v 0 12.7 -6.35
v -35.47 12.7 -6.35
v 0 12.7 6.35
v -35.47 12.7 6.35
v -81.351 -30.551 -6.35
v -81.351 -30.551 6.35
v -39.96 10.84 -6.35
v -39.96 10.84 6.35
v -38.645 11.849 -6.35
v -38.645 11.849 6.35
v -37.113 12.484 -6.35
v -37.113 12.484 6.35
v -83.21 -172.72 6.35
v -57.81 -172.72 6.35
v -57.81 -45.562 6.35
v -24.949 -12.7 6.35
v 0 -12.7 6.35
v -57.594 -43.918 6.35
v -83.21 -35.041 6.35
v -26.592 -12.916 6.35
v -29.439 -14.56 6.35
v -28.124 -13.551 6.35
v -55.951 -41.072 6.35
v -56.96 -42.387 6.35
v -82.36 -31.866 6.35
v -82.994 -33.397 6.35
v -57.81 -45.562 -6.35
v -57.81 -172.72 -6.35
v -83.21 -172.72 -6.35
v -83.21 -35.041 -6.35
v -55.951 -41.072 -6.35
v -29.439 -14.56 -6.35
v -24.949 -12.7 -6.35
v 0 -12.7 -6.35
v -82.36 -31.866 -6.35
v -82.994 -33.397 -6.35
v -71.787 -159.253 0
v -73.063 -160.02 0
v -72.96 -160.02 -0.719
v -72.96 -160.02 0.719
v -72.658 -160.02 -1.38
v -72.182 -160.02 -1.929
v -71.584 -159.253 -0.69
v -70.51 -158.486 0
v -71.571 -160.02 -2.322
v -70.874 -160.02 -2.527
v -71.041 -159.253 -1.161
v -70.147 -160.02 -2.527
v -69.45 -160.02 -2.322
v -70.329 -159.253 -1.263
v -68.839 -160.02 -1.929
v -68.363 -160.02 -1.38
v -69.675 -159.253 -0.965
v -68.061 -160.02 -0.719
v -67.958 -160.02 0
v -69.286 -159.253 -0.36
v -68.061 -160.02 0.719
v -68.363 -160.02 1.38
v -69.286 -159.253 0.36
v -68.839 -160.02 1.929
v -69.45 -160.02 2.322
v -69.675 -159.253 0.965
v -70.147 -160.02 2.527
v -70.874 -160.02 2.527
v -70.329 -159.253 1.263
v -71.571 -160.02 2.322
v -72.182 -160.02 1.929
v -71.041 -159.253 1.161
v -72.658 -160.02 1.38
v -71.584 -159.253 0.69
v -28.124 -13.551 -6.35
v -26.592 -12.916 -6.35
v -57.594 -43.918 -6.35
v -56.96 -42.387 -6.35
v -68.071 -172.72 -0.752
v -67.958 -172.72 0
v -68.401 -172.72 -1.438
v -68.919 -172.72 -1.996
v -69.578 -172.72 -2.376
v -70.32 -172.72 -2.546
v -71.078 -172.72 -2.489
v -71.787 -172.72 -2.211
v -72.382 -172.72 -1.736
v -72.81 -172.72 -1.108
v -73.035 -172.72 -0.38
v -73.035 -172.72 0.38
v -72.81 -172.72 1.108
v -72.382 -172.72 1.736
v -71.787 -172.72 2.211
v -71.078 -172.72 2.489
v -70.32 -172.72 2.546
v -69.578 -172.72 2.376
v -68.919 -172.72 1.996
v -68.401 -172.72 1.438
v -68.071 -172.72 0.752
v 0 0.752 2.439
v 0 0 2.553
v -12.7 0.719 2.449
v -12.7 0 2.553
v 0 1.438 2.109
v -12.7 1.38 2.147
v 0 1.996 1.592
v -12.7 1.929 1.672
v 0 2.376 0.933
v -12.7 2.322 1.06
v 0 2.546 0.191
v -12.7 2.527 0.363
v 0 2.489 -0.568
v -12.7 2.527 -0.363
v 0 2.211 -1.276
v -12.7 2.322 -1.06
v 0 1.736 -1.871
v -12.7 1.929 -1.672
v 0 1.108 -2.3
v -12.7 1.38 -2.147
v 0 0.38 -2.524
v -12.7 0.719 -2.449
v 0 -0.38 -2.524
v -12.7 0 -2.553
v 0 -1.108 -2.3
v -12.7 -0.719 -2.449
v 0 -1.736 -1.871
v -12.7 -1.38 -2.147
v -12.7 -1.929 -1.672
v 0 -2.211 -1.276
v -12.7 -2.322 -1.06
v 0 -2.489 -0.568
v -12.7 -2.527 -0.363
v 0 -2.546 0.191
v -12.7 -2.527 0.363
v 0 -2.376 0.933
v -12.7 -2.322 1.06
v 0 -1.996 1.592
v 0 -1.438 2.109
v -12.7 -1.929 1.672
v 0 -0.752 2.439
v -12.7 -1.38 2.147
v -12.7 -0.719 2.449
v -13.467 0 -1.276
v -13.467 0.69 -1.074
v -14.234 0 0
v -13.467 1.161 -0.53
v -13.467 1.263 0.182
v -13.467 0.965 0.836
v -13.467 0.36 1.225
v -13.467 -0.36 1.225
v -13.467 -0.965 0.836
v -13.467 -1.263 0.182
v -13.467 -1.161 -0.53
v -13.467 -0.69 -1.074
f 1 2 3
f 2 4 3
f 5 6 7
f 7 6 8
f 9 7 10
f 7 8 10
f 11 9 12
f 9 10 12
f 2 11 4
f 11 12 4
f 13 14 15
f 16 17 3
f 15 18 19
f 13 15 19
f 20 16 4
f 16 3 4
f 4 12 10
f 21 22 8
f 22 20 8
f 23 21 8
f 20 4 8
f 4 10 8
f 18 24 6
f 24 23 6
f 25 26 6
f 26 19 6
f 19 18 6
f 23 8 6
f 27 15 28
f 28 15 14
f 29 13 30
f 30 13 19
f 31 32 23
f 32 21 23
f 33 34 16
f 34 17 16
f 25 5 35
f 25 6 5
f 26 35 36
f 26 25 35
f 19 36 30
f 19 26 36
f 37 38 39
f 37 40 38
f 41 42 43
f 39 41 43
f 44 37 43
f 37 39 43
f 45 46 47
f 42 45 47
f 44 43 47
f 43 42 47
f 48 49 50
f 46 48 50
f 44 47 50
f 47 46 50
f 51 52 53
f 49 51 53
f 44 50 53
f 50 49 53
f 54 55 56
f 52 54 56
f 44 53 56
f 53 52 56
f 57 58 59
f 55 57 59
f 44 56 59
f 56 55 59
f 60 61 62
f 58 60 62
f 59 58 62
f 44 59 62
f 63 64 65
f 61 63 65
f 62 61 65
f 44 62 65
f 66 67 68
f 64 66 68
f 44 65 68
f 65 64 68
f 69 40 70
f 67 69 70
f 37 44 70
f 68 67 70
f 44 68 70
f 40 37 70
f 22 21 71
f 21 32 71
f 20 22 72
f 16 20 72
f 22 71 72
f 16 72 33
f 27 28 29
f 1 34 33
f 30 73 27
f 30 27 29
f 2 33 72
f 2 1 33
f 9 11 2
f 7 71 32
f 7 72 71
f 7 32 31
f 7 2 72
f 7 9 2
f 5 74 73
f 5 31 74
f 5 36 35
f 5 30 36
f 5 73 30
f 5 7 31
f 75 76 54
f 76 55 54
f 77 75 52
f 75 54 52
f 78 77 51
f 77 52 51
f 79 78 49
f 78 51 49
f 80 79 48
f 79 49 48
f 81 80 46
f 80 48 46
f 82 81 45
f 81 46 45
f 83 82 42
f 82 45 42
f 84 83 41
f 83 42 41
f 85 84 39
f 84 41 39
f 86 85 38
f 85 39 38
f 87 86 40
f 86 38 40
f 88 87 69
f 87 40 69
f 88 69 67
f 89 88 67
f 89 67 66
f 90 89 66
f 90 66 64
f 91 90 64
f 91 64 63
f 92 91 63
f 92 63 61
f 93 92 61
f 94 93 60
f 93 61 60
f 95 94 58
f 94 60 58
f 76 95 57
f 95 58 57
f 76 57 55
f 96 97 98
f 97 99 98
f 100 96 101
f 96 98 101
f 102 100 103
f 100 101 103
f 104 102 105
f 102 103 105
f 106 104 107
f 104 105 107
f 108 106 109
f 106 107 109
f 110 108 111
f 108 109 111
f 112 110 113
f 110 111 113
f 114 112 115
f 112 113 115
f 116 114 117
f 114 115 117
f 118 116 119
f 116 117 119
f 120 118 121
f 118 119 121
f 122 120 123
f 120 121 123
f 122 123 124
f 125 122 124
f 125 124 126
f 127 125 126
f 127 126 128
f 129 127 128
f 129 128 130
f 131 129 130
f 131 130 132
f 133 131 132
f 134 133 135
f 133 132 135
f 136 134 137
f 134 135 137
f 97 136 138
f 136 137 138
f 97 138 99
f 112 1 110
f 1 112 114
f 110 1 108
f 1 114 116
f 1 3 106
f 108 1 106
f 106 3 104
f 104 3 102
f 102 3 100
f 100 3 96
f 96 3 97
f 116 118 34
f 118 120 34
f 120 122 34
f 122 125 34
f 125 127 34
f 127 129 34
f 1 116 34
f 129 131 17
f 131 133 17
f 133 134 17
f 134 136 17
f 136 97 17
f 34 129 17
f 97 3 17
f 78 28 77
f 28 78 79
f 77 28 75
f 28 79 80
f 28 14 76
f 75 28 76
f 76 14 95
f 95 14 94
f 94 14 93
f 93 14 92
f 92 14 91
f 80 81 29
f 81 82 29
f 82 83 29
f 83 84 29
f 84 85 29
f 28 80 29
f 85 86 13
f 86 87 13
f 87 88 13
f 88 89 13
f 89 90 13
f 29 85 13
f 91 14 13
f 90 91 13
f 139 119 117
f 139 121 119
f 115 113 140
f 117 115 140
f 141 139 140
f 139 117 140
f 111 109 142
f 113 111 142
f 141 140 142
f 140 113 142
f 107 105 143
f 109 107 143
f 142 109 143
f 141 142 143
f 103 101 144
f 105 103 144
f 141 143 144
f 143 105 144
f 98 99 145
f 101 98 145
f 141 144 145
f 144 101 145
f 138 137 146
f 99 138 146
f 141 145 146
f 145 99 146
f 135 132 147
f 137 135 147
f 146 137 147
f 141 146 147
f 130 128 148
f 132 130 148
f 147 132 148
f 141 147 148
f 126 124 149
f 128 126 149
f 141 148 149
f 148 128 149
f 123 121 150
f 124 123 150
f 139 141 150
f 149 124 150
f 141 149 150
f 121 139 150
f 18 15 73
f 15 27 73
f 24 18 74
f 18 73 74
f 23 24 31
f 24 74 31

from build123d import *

# Parameters (mm, degrees)
BOSS_EXTRUDE1_DEPTH             = 6.35
FILLET1_R                       = 6.35
TAP_DRILL_FOR_1_4_20_TAP1_D     = 5.1054
TAP_DRILL_FOR_1_4_20_TAP1_DEPTH = 12.7
TAP_DRILL_FOR_1_4_20_TAP1_TIP   = 1.533816902
TAP_DRILL_FOR_1_4_20_TAP2_D     = 5.1054
TAP_DRILL_FOR_1_4_20_TAP2_DEPTH = 12.7
TAP_DRILL_FOR_1_4_20_TAP2_TIP   = 1.533816902


with BuildPart() as part:
    # Sketch1 → Boss-Extrude1 (new, symmetric)
    with BuildSketch(Plane.XY):
        Polygon((0, 12.7), (0, -12.7), (-27.578975516, -12.7), (-57.8104, -42.931424484), (-57.8104, -172.72), (-83.2104, -172.72), (-83.2104, -32.4104), (-38.1, 12.7), align=None)
    extrude(amount=BOSS_EXTRUDE1_DEPTH, both=True)

    # Fillet1
    fillet1_edges = [part.edges().sort_by_distance(p)[0] for p in [
        (-27.578975516, -12.7, 0),
        (-57.8104, -42.931424484, 0),
        (-83.2104, -32.4104, 0),
        (-38.1, 12.7, 0),
    ]]
    fillet(fillet1_edges, radius=FILLET1_R)

    # Tap Drill for 1/4-20 Tap1
    with Locations(Plane(origin=(0, 0, 0), x_dir=(0, 0, -1), z_dir=(1, 0, 0))):
        with Locations((0, 0)):
            Hole(TAP_DRILL_FOR_1_4_20_TAP1_D / 2, depth=TAP_DRILL_FOR_1_4_20_TAP1_DEPTH)
            with Locations((0, 0, -(TAP_DRILL_FOR_1_4_20_TAP1_DEPTH + TAP_DRILL_FOR_1_4_20_TAP1_TIP / 2))):  # 118° drill point
                Cone(0, TAP_DRILL_FOR_1_4_20_TAP1_D / 2, TAP_DRILL_FOR_1_4_20_TAP1_TIP, mode=Mode.SUBTRACT)

    # Tap Drill for 1/4-20 Tap2
    with Locations(Plane(origin=(0, -172.72, 0), x_dir=(-1, 0, 0), z_dir=(0, -1, 0))):
        with Locations((70.5104, 0)):
            Hole(TAP_DRILL_FOR_1_4_20_TAP2_D / 2, depth=TAP_DRILL_FOR_1_4_20_TAP2_DEPTH)
            with Locations((0, 0, -(TAP_DRILL_FOR_1_4_20_TAP2_DEPTH + TAP_DRILL_FOR_1_4_20_TAP2_TIP / 2))):  # 118° drill point
                Cone(0, TAP_DRILL_FOR_1_4_20_TAP2_D / 2, TAP_DRILL_FOR_1_4_20_TAP2_TIP, mode=Mode.SUBTRACT)


solid = part.part
